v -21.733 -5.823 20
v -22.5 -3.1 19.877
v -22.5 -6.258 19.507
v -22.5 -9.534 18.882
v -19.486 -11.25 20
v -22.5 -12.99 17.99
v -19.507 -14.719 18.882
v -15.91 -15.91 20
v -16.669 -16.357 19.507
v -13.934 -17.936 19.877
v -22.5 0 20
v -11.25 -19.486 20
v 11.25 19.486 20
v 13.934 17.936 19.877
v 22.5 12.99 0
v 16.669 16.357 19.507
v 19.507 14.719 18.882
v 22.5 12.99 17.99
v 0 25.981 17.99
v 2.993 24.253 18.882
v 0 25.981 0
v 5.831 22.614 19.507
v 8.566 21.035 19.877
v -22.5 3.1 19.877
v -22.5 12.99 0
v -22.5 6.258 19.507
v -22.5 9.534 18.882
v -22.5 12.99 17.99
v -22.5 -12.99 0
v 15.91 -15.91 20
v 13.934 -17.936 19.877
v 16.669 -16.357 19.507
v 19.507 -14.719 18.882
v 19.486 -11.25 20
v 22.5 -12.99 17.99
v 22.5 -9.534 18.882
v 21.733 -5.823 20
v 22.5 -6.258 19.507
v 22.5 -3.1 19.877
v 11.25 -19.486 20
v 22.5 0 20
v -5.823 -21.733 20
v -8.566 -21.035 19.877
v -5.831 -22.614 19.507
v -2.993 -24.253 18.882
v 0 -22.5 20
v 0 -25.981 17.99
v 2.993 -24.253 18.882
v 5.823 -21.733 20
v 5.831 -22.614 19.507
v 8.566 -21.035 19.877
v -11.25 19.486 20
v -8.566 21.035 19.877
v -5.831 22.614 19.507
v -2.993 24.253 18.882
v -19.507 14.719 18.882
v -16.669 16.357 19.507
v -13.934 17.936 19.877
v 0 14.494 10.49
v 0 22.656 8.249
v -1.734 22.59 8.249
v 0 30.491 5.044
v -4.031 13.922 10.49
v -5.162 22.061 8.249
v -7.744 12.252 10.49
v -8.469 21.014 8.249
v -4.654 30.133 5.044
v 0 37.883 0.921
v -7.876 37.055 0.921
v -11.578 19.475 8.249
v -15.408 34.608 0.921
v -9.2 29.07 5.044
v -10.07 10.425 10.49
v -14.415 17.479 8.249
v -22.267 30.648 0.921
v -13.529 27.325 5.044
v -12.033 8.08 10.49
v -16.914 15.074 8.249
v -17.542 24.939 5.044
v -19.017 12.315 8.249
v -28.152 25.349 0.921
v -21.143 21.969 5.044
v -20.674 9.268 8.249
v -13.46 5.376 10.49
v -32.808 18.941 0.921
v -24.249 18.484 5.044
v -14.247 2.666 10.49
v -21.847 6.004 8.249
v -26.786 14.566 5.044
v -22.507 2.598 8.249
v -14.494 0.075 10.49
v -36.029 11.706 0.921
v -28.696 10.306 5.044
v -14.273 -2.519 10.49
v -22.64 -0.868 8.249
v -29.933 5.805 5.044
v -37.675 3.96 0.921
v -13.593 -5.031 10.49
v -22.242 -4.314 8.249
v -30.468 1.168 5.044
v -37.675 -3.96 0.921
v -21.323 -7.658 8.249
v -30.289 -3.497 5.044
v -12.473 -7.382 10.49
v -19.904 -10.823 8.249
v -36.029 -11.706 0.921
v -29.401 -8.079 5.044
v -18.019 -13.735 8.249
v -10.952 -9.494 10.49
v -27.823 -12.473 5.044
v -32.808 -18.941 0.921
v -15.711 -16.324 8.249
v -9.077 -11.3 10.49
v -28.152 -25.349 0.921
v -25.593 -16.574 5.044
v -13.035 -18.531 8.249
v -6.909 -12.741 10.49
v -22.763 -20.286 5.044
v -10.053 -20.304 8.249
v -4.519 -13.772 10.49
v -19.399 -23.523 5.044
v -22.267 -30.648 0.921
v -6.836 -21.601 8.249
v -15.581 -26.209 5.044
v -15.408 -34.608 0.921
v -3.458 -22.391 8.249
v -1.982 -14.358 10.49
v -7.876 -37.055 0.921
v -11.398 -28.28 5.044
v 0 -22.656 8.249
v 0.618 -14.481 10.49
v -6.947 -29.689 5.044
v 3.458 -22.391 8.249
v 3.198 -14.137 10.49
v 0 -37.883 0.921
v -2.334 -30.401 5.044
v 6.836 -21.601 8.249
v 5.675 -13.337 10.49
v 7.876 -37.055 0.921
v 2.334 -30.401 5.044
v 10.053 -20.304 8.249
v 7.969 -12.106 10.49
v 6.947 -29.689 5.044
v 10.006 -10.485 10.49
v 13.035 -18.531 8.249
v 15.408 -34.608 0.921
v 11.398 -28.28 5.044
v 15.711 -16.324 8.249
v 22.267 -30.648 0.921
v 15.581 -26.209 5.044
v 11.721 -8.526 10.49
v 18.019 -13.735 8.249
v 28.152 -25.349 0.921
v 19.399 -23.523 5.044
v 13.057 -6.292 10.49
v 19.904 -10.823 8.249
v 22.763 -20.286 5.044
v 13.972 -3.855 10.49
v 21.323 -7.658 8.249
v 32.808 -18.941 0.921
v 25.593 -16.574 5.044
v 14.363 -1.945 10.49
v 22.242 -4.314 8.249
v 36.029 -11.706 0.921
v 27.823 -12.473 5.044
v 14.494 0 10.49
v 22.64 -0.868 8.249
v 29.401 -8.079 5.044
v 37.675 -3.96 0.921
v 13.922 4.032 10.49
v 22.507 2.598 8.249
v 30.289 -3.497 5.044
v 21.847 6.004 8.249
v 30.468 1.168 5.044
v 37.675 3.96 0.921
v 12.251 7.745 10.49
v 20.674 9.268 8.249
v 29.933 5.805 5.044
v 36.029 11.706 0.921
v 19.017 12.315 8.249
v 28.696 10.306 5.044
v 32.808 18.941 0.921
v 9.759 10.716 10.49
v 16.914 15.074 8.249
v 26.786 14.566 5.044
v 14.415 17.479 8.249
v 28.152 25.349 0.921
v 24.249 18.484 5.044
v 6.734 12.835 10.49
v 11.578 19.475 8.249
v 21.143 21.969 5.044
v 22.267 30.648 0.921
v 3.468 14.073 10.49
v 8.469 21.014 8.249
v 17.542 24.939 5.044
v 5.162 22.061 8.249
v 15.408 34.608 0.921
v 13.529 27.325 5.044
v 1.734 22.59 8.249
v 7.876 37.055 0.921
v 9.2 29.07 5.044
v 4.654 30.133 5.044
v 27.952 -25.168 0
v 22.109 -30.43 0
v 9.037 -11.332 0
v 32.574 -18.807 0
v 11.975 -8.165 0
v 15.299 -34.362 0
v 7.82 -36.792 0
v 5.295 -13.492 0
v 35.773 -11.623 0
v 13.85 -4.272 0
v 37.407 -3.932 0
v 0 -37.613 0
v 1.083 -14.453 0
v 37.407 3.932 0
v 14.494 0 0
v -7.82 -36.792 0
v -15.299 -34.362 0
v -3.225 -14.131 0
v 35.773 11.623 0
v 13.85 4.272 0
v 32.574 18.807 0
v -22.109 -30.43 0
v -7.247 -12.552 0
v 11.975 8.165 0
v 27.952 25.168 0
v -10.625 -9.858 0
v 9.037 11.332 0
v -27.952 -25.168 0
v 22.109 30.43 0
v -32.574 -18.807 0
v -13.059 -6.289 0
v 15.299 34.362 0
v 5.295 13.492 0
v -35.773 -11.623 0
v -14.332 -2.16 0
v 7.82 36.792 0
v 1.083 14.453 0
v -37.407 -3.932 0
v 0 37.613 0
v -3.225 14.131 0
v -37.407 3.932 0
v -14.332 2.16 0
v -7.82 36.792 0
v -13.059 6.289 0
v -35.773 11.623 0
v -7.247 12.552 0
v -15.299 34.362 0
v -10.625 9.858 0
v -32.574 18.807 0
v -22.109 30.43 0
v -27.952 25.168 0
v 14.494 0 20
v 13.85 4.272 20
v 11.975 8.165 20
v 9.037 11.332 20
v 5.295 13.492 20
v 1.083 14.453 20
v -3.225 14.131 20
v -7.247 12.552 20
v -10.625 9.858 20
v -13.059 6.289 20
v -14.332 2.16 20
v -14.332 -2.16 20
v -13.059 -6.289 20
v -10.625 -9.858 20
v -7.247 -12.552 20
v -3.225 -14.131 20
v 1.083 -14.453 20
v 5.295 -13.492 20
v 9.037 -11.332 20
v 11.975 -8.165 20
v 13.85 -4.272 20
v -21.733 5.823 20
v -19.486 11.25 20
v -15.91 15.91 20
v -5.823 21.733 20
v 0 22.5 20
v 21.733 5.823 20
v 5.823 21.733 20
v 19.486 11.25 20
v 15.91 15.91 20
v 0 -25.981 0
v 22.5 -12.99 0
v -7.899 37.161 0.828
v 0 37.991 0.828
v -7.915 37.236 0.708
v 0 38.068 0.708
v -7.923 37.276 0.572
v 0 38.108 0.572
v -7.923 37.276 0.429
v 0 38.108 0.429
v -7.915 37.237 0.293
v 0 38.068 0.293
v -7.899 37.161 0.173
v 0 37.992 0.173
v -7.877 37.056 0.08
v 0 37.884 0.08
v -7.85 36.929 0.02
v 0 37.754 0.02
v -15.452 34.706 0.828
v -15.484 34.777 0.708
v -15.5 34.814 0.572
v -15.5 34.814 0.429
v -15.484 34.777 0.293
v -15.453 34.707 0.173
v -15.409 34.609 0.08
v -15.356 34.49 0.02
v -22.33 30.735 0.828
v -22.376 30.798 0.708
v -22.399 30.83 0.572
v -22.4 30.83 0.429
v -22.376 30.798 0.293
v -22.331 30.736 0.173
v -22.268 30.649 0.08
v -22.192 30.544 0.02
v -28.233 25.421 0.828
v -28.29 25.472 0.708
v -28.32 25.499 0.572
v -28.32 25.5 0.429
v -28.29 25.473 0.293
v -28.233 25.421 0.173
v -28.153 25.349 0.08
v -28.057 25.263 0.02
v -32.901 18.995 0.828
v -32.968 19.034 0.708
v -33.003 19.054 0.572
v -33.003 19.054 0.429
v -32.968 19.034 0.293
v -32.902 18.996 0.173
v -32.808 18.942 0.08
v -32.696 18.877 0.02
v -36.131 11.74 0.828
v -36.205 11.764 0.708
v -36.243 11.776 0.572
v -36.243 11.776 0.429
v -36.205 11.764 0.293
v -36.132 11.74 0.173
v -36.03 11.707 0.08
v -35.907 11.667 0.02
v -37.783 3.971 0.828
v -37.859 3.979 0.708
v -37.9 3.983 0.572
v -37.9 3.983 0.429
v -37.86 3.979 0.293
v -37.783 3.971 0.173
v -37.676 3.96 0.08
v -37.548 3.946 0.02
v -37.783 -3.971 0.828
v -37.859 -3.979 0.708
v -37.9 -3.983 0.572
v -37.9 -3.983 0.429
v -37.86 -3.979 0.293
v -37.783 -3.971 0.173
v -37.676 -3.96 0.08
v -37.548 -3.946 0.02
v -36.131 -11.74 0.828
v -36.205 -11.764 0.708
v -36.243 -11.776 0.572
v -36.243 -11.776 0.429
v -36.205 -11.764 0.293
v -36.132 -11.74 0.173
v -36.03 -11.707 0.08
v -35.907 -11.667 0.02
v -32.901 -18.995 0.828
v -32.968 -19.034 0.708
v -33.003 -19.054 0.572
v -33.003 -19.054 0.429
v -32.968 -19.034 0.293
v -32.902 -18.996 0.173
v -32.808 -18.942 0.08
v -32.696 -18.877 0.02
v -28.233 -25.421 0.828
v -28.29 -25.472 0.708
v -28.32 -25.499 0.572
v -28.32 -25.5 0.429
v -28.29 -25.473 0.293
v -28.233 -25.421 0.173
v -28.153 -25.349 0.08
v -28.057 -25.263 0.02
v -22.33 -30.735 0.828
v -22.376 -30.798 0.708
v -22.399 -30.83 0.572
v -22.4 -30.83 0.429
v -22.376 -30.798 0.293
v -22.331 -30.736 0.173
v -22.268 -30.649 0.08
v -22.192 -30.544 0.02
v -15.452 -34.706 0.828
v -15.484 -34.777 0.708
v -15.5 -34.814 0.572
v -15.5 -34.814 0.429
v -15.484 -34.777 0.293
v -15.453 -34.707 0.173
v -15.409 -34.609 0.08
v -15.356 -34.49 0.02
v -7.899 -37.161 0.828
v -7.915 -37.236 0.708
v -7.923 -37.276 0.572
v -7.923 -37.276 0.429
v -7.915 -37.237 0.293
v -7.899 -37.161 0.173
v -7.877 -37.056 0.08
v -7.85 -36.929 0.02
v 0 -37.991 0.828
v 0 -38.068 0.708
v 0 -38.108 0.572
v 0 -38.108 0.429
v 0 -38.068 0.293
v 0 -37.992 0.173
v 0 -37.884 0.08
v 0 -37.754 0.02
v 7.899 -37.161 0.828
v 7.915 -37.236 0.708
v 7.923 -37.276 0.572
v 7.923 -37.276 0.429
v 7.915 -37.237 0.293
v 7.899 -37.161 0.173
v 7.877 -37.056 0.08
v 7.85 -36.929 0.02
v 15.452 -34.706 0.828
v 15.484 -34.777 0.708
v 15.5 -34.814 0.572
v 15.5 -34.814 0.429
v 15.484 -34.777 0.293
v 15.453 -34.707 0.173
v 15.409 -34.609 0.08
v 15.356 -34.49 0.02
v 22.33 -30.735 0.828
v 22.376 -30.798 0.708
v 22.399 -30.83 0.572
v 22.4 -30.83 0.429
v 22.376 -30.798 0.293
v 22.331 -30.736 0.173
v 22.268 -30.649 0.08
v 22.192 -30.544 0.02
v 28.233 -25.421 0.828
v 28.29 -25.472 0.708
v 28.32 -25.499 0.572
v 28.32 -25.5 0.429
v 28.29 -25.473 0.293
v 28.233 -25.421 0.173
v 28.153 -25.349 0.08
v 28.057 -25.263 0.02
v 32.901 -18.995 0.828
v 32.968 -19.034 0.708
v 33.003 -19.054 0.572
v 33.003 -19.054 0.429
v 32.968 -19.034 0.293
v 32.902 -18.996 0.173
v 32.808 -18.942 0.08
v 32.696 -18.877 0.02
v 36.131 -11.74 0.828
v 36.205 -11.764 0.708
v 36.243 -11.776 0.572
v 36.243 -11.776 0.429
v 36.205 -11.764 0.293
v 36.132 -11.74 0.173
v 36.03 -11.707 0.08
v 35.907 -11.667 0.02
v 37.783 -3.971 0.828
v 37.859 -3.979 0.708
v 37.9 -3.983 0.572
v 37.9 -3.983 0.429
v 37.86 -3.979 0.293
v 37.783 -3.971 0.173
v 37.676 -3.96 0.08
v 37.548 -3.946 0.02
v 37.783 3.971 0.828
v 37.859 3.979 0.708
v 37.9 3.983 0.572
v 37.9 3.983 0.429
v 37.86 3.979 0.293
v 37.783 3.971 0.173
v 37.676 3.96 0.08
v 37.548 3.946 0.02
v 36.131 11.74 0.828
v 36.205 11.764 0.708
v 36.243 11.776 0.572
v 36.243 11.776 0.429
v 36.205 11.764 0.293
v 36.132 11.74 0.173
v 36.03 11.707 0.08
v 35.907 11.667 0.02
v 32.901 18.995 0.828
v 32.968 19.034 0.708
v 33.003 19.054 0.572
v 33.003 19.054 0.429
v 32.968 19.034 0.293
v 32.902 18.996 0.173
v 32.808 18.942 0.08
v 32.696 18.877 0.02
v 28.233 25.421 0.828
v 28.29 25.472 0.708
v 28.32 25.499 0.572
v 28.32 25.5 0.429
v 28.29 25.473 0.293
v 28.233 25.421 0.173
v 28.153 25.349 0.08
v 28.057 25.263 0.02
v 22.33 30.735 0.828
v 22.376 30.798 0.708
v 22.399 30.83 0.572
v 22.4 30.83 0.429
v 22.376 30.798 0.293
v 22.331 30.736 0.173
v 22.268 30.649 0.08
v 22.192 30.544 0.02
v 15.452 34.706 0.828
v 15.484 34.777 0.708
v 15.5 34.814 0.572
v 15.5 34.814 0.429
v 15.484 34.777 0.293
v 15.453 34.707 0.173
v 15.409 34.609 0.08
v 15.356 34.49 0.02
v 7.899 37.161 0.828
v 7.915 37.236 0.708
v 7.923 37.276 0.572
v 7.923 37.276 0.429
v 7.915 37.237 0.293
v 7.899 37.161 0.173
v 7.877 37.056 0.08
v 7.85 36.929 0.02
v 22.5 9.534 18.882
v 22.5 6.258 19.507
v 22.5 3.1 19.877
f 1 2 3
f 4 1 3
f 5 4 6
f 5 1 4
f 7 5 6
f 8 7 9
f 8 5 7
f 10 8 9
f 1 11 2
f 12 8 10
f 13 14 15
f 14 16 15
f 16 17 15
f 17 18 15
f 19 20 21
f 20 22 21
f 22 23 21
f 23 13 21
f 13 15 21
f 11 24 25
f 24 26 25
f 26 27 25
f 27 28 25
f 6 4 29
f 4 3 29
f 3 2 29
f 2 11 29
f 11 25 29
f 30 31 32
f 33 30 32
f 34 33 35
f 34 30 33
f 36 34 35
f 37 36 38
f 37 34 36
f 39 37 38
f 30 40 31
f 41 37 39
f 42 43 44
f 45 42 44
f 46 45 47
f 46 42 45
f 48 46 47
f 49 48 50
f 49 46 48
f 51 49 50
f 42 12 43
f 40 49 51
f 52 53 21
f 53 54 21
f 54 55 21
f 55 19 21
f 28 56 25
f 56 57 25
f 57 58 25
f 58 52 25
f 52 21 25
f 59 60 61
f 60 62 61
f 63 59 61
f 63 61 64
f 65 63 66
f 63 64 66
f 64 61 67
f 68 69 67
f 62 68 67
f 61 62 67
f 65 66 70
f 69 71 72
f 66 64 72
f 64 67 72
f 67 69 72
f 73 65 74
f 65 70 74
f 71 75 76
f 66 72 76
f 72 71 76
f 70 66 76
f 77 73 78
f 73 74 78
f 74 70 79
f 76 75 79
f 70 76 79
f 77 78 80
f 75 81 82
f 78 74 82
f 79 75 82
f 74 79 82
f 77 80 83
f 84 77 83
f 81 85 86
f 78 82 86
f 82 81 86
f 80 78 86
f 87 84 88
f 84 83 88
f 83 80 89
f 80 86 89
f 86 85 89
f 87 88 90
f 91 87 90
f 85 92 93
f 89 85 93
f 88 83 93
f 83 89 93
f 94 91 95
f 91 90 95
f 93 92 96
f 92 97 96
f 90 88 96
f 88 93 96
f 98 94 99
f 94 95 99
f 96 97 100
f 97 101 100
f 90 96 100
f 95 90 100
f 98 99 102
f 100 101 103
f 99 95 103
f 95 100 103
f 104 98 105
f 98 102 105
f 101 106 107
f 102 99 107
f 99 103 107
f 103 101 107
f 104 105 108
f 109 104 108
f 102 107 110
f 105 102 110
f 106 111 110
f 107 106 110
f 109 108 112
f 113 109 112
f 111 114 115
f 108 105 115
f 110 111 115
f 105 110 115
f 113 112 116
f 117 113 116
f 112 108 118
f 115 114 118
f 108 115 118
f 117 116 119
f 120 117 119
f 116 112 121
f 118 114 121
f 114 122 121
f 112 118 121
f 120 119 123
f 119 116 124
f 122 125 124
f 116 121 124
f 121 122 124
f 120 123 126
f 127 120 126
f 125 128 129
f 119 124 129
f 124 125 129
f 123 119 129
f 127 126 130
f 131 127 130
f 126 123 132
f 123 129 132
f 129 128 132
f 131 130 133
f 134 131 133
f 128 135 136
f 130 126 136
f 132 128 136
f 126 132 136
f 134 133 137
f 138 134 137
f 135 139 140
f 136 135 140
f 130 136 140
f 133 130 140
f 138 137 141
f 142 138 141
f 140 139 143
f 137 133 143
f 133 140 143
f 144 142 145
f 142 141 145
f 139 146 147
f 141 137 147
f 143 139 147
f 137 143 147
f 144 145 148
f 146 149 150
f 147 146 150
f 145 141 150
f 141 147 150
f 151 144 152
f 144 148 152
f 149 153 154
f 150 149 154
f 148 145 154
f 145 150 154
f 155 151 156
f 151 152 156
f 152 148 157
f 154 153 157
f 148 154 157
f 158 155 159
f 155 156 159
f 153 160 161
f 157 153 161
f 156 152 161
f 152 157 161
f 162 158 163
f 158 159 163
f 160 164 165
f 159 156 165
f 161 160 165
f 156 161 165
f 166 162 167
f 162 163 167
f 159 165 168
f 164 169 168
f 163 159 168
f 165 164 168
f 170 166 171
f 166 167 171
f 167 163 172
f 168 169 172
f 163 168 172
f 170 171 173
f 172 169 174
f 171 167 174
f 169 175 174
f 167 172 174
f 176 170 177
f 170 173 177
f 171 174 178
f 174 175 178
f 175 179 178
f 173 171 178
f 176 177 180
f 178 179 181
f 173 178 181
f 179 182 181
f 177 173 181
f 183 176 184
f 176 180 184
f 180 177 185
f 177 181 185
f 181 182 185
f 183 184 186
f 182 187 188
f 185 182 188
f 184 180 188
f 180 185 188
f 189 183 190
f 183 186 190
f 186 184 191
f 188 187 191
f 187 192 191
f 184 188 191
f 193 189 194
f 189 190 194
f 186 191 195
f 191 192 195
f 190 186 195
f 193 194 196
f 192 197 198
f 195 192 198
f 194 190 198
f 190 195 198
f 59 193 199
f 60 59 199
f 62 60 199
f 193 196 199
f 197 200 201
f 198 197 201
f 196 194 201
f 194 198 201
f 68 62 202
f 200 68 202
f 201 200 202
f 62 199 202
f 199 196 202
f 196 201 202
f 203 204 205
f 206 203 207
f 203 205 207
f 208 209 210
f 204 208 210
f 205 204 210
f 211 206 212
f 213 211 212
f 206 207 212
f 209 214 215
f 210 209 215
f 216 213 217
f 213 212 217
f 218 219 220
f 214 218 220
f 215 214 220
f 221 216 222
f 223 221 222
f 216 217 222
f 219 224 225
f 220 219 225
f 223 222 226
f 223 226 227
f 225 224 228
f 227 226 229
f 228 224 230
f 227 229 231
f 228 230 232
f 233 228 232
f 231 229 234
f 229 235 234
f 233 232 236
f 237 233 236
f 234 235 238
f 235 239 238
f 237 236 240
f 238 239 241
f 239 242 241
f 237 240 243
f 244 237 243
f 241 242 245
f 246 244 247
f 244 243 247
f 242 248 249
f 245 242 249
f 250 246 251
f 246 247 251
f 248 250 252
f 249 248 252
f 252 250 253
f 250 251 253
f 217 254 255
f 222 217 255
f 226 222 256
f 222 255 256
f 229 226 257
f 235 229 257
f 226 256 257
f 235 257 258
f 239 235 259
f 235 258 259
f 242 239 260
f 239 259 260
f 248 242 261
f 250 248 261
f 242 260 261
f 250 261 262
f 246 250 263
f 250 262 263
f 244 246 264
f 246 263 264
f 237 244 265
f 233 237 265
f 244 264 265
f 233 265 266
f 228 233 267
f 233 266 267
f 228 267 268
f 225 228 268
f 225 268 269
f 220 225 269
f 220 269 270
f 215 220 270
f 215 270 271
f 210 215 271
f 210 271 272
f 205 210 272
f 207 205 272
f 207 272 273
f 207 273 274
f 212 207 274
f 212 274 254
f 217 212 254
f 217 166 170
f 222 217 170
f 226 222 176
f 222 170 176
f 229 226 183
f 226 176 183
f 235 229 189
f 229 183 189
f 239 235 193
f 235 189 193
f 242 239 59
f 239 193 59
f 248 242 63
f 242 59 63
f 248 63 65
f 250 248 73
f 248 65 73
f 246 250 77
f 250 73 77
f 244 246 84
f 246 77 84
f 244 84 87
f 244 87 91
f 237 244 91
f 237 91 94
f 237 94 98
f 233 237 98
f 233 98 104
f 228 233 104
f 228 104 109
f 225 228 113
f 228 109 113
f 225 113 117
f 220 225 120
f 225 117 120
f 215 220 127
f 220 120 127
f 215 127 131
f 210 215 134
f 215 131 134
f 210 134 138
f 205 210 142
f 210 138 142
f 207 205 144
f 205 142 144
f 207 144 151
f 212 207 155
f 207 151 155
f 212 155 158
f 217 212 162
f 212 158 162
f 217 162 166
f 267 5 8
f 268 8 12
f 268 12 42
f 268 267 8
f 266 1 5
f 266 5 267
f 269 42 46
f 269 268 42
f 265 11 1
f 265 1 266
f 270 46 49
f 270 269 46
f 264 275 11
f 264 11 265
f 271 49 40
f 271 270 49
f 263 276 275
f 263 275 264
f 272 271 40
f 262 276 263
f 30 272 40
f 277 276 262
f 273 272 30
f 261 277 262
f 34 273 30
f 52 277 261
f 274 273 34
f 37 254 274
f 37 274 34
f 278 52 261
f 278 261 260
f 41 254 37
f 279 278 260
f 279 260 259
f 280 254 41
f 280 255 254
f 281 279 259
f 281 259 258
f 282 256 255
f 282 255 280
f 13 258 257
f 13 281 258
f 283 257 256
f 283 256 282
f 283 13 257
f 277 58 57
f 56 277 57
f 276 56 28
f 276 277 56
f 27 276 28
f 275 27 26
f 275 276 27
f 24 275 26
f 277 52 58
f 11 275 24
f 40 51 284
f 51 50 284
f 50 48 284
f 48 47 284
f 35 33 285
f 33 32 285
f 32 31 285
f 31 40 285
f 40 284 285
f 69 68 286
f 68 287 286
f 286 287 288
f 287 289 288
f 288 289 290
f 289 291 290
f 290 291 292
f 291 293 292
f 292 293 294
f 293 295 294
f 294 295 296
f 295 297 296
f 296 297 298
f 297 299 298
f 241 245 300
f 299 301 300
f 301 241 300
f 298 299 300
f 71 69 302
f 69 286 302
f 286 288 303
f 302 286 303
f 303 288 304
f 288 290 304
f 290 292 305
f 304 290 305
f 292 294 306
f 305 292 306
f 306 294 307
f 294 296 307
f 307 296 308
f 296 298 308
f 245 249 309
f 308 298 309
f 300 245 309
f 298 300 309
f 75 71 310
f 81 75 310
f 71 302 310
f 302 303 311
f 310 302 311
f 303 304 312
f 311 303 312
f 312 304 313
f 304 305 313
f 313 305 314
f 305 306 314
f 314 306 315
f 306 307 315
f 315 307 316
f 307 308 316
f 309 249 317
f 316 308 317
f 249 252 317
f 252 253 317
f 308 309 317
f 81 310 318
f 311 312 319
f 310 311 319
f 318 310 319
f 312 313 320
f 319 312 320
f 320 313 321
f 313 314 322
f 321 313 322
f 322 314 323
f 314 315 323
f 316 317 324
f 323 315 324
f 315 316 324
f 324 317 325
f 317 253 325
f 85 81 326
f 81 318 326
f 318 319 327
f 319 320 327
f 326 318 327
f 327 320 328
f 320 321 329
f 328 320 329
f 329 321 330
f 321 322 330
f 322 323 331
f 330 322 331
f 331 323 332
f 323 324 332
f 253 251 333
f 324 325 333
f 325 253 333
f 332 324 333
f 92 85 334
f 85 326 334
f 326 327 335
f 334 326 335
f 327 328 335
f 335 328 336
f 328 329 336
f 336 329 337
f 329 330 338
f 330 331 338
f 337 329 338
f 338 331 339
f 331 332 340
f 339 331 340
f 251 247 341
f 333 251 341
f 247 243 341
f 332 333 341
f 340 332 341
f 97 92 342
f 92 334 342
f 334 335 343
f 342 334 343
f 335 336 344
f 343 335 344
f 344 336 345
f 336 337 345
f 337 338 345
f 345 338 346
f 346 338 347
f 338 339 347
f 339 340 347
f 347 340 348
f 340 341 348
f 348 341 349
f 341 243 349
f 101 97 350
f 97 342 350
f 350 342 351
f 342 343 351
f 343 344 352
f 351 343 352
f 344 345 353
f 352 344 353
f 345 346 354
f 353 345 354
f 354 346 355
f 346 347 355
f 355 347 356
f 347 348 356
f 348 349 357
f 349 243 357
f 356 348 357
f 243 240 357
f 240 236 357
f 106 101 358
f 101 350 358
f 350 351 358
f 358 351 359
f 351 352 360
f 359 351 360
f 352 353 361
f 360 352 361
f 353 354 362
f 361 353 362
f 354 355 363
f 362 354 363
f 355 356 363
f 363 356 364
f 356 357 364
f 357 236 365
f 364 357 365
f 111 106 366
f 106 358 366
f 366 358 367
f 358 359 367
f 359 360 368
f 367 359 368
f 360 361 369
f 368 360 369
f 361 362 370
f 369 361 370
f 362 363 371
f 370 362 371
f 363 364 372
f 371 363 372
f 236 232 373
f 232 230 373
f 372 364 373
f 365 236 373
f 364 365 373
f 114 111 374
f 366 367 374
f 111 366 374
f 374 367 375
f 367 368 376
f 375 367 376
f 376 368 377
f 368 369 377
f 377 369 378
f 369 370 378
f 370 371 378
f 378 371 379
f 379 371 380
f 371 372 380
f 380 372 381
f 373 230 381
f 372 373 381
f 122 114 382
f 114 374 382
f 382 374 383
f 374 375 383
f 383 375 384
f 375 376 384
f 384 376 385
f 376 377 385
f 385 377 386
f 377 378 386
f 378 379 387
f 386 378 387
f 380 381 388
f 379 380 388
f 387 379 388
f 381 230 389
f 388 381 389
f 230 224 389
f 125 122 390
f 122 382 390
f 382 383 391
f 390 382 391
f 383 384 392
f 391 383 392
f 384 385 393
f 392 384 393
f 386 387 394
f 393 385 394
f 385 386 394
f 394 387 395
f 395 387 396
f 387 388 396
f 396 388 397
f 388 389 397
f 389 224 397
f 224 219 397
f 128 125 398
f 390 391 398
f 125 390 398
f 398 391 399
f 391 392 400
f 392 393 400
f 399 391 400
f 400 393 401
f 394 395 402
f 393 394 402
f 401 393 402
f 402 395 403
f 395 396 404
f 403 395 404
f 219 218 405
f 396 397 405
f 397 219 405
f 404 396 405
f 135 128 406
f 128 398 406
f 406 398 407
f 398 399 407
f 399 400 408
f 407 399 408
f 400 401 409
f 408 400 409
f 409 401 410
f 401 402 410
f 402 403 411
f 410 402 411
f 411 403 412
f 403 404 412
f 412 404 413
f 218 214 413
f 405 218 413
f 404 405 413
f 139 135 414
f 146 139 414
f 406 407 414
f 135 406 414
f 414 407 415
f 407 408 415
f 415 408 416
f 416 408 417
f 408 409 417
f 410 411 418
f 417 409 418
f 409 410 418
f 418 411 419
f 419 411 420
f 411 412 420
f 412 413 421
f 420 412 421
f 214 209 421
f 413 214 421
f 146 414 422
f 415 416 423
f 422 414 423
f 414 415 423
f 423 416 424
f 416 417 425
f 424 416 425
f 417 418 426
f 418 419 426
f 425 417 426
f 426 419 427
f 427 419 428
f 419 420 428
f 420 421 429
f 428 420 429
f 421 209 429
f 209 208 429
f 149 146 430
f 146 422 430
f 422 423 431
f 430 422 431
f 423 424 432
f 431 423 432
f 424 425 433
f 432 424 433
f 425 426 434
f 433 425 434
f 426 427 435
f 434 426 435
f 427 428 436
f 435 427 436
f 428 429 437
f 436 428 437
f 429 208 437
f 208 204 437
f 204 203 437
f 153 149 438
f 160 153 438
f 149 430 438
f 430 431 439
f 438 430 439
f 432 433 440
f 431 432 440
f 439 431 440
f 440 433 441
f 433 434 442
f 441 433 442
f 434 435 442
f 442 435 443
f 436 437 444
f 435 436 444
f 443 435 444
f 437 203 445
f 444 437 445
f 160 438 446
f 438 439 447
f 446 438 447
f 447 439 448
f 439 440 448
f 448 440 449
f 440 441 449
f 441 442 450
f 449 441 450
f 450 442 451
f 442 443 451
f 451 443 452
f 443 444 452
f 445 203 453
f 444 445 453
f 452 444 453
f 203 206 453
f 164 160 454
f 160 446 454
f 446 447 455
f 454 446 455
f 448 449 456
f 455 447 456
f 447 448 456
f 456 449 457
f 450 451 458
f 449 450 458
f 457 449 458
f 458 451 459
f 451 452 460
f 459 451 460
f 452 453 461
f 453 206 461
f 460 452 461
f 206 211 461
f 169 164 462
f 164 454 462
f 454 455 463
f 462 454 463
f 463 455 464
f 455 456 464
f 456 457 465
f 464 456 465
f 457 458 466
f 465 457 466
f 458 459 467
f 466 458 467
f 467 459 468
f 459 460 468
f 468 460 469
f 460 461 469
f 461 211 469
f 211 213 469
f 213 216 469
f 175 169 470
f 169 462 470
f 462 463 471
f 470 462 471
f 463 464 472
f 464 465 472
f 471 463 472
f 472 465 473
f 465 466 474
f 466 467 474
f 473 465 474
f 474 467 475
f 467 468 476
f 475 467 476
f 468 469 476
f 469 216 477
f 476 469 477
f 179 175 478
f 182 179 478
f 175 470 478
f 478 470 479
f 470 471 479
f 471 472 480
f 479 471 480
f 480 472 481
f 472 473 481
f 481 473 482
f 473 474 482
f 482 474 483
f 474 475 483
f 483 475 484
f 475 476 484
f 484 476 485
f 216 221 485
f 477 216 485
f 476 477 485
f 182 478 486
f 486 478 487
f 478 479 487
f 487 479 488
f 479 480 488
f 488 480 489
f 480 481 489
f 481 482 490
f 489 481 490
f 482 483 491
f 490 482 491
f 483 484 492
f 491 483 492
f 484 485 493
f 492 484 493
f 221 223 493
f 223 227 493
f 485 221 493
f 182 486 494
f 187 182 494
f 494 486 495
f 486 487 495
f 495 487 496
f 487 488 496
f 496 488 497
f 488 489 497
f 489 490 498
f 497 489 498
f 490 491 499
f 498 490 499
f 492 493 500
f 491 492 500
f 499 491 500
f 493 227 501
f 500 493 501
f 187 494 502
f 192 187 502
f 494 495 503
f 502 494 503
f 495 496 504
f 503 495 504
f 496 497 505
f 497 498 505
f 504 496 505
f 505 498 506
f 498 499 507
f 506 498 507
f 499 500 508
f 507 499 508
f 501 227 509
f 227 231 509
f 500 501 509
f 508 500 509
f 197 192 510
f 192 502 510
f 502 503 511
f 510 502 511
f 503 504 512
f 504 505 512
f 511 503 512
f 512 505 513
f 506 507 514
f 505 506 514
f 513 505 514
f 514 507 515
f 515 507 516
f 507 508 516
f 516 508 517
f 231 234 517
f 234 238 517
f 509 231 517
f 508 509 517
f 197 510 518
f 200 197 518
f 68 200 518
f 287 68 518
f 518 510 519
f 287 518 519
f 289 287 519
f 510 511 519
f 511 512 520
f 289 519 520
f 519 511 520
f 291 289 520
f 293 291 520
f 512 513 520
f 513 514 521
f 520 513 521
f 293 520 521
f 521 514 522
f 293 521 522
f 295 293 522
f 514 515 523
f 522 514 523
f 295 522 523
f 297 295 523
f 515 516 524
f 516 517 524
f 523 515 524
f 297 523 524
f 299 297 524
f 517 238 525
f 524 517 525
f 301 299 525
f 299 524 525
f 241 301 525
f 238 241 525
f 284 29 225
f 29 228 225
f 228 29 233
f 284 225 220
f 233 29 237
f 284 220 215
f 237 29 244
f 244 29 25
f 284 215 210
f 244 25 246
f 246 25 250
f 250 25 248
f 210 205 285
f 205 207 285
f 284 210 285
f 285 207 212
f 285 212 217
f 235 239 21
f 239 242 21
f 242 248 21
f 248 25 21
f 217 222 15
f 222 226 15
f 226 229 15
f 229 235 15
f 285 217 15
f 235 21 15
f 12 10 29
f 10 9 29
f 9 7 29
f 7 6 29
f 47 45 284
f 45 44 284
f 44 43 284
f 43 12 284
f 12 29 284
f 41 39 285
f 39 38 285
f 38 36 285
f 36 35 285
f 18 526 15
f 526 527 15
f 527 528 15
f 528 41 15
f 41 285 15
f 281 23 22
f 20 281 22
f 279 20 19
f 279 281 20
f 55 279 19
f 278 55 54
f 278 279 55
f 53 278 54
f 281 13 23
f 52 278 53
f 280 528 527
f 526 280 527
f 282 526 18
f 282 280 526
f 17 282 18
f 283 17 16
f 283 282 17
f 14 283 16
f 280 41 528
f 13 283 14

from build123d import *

# Parameters (mm, degrees)
BOSS_EXTRUDE1_DEPTH = 20
SKETCH3_OUTSIDE_W   = 169.436
SKETCH3_OUTSIDE_H   = 169.436
SKETCH3_OUTSIDE_R   = 22.5
CUT_EXTRUDE1_DEPTH  = 20
CUT_EXTRUDE1_DRAFT  = -60
SKETCH4_R           = 14.493939327
CUT_EXTRUDE3_DEPTH  = 58.491490699


with BuildPart() as part:
    # Sketch1 → Boss-Extrude1 (new body)
    with BuildSketch(Plane.XY):
        Polygon((22.5, -12.990381057), (22.5, 12.990381057), (0, 25.980762114), (-22.5, 12.990381057), (-22.5, -12.990381057), (0, -25.980762114), align=None)
    extrude(amount=BOSS_EXTRUDE1_DEPTH)


with BuildPart() as body_2:
    # Sketch2 → Revolve2 (revolve)
    with BuildSketch(Plane(origin=(0, 0, 0), x_dir=(0, 0, -1), z_dir=(1, 0, 0)), mode=Mode.PRIVATE) as revolve2_sk:
        with BuildLine():
            Line((0, 0), (-12, 0))
            ThreePointArc((-12, 0), (-9.173487396, -19.734811075), (-0.921212278, -37.882865986))
            ThreePointArc((-0.921212278, -37.882865986), (-0.359654246, -38.093357847), (0, -37.613458827))
            Line((0, -37.613458827), (0, 0))
        make_face()
    revolve(revolve2_sk.sketch.rotate(Axis((0, 0, 0), (0, 0, 1)), 180), axis=Axis((0, 0, 0), (0, 0, 1)))


with BuildPart() as cut_extrude1_tool:
    # Sketch3 outside → Cut-Extrude1 (with draft: the straight prism first)
    with BuildSketch(Plane.XY.offset(20)):
        Rectangle(SKETCH3_OUTSIDE_W, SKETCH3_OUTSIDE_H)
        Circle(SKETCH3_OUTSIDE_R, mode=Mode.SUBTRACT)
    extrude(amount=-CUT_EXTRUDE1_DEPTH)
    # Cut-Extrude1: the draft: its side faces are tilted about the plane it starts from
    cut_extrude1_sides = [cut_extrude1_tool.faces().sort_by_distance(p)[0] for p in [
        (0, -84.718, 10),
        (84.718, 0, 10),
        (0, 84.718, 10),
        (-84.718, 0, 10),
        (-22.5, 0, 10),
    ]]
    draft(cut_extrude1_sides, Plane.XY.offset(20), CUT_EXTRUDE1_DRAFT)


with BuildPart() as part_1:
    add(part.part)

    # Cut-Extrude1: cut by cut_extrude1_tool
    add(cut_extrude1_tool.part, mode=Mode.SUBTRACT)


with BuildPart() as cut_extrude3_tool:
    # Sketch4 → Cut-Extrude3 (new, through all)
    with BuildSketch(Plane.XY.offset(20)):
        Circle(SKETCH4_R)
    extrude(amount=-CUT_EXTRUDE3_DEPTH)


with BuildPart() as part_2:
    add(part_1.part)

    # Cut-Extrude3: cut by cut_extrude3_tool
    add(cut_extrude3_tool.part, mode=Mode.SUBTRACT)


with BuildPart() as body_2_1:
    add(body_2.part)

    # Cut-Extrude3: cut by cut_extrude3_tool
    add(cut_extrude3_tool.part, mode=Mode.SUBTRACT)


solid = Compound([part_2.part, body_2_1.part])
